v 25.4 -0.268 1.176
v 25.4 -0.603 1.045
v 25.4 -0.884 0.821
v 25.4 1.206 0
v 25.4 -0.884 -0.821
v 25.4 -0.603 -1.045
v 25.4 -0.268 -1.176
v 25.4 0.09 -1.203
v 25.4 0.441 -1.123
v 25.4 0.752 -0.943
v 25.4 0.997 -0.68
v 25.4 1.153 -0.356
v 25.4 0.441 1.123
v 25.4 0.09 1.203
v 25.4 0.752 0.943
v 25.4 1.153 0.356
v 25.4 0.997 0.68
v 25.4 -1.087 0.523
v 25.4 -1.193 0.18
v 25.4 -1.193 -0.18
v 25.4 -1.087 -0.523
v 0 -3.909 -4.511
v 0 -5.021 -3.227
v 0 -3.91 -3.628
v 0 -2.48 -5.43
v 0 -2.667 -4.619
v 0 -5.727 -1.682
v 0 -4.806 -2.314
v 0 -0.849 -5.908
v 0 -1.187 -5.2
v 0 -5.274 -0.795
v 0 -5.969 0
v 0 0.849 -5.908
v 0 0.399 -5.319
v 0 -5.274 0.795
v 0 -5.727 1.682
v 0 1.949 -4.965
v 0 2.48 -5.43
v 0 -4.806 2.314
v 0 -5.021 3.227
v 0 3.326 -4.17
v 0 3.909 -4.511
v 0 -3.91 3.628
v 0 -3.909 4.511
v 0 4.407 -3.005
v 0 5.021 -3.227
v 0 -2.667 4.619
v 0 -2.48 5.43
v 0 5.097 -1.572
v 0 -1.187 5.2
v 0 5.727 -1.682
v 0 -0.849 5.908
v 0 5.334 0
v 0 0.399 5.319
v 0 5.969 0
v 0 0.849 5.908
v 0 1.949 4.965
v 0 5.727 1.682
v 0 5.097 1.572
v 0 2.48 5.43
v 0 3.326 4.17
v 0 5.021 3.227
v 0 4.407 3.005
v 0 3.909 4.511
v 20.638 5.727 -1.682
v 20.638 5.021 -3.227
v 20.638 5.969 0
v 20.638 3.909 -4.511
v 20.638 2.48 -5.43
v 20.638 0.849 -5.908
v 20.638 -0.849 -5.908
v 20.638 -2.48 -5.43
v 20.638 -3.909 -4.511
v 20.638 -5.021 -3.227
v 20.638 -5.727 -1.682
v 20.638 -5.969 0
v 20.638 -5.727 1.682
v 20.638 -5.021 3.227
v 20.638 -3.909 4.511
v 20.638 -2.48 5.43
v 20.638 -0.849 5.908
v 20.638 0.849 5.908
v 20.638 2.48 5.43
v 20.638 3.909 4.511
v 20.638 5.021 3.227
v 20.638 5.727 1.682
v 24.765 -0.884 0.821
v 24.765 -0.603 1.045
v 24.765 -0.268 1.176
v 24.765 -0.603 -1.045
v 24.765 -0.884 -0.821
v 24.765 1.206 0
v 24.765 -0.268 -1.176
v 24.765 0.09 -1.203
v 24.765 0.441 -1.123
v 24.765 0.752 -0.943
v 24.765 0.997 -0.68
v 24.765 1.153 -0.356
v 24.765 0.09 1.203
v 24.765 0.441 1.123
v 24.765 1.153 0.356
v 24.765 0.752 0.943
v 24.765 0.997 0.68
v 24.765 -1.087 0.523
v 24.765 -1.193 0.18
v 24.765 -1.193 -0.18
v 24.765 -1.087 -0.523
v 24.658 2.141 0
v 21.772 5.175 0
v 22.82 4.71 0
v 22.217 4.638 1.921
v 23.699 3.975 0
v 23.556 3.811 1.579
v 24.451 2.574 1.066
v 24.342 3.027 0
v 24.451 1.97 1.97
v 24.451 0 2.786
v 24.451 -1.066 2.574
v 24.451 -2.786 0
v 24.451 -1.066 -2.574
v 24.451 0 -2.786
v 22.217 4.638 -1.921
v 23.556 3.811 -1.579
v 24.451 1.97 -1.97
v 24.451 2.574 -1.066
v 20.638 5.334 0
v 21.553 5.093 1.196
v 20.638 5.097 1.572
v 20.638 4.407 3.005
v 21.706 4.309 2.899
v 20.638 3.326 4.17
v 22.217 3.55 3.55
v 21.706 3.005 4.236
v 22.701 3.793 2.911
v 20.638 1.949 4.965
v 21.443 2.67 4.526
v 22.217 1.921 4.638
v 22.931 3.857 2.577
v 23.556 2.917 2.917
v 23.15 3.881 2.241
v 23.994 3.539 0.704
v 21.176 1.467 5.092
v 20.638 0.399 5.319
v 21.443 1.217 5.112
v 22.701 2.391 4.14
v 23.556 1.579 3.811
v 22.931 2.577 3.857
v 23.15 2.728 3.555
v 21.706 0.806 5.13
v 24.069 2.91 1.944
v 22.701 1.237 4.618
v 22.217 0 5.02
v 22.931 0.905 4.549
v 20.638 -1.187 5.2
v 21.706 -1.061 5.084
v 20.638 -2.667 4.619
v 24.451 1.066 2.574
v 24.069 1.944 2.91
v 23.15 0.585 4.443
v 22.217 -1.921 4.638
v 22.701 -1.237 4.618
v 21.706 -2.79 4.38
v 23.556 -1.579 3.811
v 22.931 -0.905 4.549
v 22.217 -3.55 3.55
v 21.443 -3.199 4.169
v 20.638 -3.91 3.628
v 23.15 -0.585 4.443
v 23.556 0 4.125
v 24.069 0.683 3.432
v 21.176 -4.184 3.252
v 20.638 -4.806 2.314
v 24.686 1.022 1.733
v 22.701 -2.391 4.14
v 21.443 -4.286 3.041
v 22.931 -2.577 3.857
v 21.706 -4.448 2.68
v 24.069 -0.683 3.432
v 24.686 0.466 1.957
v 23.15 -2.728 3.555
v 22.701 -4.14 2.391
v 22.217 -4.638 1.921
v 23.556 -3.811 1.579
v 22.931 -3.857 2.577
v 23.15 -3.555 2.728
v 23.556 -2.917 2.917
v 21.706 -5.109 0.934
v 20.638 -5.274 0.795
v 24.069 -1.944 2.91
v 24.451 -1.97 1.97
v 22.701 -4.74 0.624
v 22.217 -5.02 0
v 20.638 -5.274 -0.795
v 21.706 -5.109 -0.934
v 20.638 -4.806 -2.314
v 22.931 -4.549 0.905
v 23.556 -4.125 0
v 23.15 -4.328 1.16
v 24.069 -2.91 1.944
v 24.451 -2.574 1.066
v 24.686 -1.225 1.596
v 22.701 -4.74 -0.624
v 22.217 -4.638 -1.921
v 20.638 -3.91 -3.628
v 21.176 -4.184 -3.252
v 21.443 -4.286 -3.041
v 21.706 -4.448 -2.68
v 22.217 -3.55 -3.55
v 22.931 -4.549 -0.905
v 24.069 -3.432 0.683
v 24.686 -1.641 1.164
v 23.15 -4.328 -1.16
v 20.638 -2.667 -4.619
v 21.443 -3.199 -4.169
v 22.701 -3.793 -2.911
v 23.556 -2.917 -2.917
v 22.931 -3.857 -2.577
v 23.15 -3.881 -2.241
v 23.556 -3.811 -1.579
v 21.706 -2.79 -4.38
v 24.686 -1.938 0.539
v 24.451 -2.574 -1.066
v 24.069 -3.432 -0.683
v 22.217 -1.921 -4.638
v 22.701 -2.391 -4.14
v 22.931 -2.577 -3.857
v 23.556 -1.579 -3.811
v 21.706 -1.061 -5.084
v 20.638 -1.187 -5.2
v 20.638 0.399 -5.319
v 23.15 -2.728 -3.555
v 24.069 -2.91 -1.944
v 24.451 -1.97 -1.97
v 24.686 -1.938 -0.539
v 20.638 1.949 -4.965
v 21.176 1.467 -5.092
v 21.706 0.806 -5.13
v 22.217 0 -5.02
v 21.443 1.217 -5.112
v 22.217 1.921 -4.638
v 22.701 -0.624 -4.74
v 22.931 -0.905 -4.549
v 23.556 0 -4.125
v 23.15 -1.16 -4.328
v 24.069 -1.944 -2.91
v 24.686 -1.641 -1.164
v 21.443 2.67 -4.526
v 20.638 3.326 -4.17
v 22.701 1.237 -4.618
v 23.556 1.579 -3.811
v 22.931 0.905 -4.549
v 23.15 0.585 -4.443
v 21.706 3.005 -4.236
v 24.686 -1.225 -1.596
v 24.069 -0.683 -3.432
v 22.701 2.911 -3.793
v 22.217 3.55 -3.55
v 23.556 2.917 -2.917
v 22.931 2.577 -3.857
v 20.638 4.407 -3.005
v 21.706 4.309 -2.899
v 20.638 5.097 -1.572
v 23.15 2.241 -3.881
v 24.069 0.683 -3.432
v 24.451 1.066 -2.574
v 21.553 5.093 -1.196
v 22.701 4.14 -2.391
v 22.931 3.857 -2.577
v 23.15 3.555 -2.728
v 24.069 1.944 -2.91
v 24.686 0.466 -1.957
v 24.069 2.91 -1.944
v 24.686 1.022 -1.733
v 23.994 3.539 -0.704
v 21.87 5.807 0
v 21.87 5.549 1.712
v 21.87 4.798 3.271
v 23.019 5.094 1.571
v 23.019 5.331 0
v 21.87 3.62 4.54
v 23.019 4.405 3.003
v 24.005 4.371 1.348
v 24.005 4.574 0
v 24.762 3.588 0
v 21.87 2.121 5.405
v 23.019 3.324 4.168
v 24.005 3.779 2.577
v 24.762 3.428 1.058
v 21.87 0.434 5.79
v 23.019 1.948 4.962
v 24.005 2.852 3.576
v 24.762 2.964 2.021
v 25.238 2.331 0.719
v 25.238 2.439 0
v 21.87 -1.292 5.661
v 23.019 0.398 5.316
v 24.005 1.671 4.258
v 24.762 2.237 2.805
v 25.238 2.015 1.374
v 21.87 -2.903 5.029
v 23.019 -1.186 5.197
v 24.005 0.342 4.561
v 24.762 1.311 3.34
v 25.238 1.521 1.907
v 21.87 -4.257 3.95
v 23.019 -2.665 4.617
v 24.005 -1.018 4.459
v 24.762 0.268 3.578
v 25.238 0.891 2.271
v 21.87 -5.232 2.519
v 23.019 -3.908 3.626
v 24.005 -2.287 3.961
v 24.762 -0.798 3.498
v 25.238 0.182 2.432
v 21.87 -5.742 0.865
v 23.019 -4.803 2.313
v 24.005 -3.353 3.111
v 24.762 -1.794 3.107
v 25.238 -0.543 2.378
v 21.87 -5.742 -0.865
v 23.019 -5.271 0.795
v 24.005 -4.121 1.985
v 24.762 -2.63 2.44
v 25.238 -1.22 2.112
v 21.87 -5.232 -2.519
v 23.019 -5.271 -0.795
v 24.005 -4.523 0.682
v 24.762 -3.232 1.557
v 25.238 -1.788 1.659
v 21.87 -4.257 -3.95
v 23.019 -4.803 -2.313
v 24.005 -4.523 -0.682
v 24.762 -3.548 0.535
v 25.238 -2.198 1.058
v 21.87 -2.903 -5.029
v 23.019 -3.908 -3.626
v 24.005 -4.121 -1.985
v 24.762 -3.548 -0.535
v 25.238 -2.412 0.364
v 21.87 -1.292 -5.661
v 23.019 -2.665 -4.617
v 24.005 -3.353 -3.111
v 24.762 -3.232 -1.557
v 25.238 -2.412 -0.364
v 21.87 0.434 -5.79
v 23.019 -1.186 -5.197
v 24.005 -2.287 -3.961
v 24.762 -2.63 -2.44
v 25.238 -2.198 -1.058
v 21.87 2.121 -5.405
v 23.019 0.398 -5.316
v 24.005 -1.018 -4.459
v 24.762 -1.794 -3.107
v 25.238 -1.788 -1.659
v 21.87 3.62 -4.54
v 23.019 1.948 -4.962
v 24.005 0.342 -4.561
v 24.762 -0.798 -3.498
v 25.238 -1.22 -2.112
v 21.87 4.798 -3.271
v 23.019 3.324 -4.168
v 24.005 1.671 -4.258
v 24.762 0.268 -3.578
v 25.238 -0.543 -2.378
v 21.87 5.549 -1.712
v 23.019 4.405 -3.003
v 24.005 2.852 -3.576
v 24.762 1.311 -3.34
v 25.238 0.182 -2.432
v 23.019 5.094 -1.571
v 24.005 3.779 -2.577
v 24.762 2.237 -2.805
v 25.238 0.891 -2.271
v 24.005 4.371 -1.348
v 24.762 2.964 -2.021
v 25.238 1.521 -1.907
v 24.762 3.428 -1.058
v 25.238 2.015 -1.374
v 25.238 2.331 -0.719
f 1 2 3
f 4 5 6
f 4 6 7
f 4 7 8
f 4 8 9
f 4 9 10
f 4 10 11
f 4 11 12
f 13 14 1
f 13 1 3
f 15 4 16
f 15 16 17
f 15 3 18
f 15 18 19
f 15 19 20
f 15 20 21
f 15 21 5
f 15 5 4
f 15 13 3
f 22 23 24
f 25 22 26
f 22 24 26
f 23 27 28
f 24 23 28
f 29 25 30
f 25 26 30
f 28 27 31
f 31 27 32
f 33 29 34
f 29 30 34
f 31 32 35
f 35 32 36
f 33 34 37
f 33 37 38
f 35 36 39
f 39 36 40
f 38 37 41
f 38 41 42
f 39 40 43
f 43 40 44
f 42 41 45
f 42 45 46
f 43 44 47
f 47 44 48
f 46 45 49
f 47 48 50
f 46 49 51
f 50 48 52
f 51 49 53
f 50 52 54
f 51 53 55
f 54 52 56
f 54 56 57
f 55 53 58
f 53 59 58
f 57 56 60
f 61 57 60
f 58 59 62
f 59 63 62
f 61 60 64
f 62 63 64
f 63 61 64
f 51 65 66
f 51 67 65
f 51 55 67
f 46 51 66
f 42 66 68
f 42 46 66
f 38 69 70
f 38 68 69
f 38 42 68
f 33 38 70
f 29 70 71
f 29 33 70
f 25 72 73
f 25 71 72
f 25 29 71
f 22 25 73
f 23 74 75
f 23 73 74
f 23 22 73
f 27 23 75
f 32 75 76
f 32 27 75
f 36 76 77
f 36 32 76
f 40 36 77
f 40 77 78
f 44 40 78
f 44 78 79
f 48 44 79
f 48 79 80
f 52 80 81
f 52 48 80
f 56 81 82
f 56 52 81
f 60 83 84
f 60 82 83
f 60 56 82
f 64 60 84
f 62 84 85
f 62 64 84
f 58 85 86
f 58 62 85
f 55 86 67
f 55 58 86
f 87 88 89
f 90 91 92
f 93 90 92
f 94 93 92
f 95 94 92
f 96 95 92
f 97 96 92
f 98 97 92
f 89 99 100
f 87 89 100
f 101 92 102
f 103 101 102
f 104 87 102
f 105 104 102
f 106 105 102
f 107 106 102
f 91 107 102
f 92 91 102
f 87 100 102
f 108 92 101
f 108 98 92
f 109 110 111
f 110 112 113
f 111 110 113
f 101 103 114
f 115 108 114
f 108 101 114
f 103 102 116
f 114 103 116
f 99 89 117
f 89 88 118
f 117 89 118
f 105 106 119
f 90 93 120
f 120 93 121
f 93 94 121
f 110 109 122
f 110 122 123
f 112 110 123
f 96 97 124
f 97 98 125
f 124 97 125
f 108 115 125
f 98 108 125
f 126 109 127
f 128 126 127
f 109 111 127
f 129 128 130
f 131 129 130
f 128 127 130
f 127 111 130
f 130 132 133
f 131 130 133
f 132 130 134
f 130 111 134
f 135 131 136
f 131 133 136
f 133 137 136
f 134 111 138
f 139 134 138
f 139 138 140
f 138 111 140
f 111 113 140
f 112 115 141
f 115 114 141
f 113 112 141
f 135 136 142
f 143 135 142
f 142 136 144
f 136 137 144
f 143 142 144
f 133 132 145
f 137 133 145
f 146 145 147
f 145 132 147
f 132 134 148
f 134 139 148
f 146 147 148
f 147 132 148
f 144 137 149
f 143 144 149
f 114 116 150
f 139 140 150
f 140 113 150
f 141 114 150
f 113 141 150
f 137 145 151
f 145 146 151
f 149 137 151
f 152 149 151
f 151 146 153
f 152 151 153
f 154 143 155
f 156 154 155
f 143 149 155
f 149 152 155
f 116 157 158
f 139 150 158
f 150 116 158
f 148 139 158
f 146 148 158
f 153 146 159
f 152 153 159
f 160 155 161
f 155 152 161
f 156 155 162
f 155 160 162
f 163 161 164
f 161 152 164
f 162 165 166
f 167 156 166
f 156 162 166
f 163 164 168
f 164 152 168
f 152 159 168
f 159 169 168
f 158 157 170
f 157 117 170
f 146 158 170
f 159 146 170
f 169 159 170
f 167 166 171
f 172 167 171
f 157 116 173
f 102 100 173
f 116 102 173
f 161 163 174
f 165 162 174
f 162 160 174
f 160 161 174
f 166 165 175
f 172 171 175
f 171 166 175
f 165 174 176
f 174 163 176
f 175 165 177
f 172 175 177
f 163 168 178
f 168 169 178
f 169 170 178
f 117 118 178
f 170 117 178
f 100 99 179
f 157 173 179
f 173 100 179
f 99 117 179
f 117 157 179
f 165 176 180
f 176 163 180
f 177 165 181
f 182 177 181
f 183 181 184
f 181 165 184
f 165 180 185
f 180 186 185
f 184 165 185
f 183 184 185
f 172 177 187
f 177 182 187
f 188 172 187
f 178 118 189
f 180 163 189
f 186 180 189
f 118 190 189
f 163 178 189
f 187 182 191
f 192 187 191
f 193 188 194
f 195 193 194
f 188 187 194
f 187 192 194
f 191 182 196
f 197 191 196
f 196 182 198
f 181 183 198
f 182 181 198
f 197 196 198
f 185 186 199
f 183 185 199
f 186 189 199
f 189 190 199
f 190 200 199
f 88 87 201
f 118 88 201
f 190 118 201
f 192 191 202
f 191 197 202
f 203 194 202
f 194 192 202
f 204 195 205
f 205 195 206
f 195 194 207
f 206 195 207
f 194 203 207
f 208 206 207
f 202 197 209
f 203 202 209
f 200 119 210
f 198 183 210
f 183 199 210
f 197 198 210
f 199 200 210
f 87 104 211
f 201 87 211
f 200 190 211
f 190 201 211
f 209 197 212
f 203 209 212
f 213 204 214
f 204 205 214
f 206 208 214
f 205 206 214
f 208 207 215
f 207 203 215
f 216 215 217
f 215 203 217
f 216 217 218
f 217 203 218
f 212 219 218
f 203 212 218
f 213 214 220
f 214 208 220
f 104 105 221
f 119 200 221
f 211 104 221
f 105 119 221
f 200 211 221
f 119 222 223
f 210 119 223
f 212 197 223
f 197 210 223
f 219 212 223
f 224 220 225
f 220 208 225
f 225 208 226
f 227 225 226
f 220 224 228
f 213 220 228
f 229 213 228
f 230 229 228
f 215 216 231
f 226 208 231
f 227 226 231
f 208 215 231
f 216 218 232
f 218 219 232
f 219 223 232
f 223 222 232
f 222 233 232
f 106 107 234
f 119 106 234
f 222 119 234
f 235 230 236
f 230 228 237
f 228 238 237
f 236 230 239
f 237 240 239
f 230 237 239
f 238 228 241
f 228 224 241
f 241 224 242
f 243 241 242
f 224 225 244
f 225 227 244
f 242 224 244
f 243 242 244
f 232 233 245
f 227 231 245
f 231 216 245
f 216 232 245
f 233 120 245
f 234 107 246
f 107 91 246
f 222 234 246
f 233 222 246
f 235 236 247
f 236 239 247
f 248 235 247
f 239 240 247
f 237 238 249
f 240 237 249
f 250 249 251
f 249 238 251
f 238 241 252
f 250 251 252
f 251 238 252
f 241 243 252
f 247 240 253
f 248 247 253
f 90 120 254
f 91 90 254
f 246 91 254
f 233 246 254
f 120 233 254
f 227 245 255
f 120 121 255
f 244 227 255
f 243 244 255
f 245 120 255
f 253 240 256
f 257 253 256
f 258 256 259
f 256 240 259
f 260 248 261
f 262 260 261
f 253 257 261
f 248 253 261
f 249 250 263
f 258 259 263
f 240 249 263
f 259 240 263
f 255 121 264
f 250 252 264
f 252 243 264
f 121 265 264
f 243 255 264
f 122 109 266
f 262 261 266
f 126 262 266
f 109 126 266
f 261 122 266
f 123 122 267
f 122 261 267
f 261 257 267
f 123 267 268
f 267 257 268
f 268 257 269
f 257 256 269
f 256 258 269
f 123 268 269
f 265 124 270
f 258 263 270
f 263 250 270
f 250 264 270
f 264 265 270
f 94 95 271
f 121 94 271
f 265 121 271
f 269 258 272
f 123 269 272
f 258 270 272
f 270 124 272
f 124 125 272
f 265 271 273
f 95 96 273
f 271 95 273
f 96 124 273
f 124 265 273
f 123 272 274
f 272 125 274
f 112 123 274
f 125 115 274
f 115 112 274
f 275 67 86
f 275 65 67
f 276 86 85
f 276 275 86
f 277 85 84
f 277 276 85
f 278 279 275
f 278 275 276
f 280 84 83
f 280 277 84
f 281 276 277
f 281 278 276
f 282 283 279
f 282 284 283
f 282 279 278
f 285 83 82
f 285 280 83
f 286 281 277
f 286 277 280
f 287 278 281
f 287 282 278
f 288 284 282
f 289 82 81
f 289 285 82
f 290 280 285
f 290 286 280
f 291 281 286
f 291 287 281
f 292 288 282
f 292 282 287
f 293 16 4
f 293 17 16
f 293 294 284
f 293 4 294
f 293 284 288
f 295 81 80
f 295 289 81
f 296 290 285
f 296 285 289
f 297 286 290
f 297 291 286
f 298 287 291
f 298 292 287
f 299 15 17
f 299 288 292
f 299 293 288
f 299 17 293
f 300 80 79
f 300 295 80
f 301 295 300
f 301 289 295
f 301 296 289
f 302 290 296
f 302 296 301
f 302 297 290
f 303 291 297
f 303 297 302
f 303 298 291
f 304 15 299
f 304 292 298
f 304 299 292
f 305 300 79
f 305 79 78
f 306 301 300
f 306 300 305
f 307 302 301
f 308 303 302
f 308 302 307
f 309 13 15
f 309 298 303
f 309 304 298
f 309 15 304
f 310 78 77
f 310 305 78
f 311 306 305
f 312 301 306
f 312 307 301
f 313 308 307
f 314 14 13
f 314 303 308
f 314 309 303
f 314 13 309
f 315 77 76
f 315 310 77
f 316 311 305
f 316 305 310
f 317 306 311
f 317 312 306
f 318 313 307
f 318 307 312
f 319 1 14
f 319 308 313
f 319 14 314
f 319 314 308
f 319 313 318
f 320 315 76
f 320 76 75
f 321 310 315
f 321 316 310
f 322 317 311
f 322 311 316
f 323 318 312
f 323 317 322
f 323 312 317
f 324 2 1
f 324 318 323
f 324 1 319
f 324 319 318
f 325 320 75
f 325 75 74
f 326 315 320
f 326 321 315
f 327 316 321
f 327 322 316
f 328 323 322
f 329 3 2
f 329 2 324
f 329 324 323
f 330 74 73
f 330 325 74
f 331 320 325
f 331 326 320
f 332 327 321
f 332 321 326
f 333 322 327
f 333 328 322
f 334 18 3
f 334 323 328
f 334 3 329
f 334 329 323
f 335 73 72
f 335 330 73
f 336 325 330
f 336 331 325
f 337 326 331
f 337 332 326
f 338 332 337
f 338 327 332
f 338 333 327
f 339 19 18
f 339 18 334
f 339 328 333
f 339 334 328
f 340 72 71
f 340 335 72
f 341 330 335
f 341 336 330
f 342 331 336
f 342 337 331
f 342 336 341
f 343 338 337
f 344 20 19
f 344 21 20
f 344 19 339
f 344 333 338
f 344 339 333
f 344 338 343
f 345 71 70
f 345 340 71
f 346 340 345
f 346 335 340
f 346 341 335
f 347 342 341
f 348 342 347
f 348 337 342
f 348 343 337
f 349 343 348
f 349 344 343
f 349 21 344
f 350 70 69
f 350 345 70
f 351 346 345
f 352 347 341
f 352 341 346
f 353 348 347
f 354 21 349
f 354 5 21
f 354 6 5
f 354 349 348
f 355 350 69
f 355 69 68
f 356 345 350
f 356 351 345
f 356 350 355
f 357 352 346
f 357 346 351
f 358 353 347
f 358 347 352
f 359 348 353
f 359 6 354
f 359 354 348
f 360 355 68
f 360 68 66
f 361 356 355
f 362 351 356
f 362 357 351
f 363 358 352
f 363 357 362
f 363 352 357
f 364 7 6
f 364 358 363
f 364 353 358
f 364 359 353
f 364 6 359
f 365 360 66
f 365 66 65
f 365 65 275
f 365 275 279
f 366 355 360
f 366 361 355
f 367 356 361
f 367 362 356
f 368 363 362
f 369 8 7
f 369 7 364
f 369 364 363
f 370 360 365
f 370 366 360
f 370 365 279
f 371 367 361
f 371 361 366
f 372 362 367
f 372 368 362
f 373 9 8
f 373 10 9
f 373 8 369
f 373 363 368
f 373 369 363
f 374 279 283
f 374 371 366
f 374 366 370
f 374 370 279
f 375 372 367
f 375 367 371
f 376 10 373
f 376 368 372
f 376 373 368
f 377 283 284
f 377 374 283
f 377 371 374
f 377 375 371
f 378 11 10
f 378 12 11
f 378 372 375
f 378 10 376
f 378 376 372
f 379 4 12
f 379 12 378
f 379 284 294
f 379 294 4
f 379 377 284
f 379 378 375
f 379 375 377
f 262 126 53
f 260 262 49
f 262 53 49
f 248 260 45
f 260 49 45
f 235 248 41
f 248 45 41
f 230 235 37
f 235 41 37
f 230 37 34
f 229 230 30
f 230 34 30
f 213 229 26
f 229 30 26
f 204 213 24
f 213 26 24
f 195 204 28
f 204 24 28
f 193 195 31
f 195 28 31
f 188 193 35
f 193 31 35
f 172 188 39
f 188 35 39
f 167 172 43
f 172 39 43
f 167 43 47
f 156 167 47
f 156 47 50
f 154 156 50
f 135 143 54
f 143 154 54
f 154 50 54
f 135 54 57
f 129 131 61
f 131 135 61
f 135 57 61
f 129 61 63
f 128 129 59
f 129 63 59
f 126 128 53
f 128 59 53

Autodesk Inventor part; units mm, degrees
ref_plane "YZ Plane" through (0, 0, 0) normal (1, 0, 0) x (0, 1, 0)
ref_plane "XZ Plane" through (0, 0, 0) normal (0, 1, 0) x (-1, 0, 0)
ref_plane "XY Plane" through (0, 0, 0) normal (0, 0, 1) x (1, 0, 0)
sketch "Sketch1" plane through (0, 0, 0) normal (1, 0, 0) x (0, 1, 0)
  circle A0 centre (0, 0) radius 5.969
  dimension "d0" = 11.938
extrude "Extrusion1" add sketch "Sketch1" along normal blind 25.4
fillet "Fillet1" radius 4.7625 1 edges at (25.4, -5.969, 0)
shell "Shell1" thickness 0.635 removed faces 1 at (0, -1.9689, -1.3194)
properties part number "piston cup" material "Glass"
